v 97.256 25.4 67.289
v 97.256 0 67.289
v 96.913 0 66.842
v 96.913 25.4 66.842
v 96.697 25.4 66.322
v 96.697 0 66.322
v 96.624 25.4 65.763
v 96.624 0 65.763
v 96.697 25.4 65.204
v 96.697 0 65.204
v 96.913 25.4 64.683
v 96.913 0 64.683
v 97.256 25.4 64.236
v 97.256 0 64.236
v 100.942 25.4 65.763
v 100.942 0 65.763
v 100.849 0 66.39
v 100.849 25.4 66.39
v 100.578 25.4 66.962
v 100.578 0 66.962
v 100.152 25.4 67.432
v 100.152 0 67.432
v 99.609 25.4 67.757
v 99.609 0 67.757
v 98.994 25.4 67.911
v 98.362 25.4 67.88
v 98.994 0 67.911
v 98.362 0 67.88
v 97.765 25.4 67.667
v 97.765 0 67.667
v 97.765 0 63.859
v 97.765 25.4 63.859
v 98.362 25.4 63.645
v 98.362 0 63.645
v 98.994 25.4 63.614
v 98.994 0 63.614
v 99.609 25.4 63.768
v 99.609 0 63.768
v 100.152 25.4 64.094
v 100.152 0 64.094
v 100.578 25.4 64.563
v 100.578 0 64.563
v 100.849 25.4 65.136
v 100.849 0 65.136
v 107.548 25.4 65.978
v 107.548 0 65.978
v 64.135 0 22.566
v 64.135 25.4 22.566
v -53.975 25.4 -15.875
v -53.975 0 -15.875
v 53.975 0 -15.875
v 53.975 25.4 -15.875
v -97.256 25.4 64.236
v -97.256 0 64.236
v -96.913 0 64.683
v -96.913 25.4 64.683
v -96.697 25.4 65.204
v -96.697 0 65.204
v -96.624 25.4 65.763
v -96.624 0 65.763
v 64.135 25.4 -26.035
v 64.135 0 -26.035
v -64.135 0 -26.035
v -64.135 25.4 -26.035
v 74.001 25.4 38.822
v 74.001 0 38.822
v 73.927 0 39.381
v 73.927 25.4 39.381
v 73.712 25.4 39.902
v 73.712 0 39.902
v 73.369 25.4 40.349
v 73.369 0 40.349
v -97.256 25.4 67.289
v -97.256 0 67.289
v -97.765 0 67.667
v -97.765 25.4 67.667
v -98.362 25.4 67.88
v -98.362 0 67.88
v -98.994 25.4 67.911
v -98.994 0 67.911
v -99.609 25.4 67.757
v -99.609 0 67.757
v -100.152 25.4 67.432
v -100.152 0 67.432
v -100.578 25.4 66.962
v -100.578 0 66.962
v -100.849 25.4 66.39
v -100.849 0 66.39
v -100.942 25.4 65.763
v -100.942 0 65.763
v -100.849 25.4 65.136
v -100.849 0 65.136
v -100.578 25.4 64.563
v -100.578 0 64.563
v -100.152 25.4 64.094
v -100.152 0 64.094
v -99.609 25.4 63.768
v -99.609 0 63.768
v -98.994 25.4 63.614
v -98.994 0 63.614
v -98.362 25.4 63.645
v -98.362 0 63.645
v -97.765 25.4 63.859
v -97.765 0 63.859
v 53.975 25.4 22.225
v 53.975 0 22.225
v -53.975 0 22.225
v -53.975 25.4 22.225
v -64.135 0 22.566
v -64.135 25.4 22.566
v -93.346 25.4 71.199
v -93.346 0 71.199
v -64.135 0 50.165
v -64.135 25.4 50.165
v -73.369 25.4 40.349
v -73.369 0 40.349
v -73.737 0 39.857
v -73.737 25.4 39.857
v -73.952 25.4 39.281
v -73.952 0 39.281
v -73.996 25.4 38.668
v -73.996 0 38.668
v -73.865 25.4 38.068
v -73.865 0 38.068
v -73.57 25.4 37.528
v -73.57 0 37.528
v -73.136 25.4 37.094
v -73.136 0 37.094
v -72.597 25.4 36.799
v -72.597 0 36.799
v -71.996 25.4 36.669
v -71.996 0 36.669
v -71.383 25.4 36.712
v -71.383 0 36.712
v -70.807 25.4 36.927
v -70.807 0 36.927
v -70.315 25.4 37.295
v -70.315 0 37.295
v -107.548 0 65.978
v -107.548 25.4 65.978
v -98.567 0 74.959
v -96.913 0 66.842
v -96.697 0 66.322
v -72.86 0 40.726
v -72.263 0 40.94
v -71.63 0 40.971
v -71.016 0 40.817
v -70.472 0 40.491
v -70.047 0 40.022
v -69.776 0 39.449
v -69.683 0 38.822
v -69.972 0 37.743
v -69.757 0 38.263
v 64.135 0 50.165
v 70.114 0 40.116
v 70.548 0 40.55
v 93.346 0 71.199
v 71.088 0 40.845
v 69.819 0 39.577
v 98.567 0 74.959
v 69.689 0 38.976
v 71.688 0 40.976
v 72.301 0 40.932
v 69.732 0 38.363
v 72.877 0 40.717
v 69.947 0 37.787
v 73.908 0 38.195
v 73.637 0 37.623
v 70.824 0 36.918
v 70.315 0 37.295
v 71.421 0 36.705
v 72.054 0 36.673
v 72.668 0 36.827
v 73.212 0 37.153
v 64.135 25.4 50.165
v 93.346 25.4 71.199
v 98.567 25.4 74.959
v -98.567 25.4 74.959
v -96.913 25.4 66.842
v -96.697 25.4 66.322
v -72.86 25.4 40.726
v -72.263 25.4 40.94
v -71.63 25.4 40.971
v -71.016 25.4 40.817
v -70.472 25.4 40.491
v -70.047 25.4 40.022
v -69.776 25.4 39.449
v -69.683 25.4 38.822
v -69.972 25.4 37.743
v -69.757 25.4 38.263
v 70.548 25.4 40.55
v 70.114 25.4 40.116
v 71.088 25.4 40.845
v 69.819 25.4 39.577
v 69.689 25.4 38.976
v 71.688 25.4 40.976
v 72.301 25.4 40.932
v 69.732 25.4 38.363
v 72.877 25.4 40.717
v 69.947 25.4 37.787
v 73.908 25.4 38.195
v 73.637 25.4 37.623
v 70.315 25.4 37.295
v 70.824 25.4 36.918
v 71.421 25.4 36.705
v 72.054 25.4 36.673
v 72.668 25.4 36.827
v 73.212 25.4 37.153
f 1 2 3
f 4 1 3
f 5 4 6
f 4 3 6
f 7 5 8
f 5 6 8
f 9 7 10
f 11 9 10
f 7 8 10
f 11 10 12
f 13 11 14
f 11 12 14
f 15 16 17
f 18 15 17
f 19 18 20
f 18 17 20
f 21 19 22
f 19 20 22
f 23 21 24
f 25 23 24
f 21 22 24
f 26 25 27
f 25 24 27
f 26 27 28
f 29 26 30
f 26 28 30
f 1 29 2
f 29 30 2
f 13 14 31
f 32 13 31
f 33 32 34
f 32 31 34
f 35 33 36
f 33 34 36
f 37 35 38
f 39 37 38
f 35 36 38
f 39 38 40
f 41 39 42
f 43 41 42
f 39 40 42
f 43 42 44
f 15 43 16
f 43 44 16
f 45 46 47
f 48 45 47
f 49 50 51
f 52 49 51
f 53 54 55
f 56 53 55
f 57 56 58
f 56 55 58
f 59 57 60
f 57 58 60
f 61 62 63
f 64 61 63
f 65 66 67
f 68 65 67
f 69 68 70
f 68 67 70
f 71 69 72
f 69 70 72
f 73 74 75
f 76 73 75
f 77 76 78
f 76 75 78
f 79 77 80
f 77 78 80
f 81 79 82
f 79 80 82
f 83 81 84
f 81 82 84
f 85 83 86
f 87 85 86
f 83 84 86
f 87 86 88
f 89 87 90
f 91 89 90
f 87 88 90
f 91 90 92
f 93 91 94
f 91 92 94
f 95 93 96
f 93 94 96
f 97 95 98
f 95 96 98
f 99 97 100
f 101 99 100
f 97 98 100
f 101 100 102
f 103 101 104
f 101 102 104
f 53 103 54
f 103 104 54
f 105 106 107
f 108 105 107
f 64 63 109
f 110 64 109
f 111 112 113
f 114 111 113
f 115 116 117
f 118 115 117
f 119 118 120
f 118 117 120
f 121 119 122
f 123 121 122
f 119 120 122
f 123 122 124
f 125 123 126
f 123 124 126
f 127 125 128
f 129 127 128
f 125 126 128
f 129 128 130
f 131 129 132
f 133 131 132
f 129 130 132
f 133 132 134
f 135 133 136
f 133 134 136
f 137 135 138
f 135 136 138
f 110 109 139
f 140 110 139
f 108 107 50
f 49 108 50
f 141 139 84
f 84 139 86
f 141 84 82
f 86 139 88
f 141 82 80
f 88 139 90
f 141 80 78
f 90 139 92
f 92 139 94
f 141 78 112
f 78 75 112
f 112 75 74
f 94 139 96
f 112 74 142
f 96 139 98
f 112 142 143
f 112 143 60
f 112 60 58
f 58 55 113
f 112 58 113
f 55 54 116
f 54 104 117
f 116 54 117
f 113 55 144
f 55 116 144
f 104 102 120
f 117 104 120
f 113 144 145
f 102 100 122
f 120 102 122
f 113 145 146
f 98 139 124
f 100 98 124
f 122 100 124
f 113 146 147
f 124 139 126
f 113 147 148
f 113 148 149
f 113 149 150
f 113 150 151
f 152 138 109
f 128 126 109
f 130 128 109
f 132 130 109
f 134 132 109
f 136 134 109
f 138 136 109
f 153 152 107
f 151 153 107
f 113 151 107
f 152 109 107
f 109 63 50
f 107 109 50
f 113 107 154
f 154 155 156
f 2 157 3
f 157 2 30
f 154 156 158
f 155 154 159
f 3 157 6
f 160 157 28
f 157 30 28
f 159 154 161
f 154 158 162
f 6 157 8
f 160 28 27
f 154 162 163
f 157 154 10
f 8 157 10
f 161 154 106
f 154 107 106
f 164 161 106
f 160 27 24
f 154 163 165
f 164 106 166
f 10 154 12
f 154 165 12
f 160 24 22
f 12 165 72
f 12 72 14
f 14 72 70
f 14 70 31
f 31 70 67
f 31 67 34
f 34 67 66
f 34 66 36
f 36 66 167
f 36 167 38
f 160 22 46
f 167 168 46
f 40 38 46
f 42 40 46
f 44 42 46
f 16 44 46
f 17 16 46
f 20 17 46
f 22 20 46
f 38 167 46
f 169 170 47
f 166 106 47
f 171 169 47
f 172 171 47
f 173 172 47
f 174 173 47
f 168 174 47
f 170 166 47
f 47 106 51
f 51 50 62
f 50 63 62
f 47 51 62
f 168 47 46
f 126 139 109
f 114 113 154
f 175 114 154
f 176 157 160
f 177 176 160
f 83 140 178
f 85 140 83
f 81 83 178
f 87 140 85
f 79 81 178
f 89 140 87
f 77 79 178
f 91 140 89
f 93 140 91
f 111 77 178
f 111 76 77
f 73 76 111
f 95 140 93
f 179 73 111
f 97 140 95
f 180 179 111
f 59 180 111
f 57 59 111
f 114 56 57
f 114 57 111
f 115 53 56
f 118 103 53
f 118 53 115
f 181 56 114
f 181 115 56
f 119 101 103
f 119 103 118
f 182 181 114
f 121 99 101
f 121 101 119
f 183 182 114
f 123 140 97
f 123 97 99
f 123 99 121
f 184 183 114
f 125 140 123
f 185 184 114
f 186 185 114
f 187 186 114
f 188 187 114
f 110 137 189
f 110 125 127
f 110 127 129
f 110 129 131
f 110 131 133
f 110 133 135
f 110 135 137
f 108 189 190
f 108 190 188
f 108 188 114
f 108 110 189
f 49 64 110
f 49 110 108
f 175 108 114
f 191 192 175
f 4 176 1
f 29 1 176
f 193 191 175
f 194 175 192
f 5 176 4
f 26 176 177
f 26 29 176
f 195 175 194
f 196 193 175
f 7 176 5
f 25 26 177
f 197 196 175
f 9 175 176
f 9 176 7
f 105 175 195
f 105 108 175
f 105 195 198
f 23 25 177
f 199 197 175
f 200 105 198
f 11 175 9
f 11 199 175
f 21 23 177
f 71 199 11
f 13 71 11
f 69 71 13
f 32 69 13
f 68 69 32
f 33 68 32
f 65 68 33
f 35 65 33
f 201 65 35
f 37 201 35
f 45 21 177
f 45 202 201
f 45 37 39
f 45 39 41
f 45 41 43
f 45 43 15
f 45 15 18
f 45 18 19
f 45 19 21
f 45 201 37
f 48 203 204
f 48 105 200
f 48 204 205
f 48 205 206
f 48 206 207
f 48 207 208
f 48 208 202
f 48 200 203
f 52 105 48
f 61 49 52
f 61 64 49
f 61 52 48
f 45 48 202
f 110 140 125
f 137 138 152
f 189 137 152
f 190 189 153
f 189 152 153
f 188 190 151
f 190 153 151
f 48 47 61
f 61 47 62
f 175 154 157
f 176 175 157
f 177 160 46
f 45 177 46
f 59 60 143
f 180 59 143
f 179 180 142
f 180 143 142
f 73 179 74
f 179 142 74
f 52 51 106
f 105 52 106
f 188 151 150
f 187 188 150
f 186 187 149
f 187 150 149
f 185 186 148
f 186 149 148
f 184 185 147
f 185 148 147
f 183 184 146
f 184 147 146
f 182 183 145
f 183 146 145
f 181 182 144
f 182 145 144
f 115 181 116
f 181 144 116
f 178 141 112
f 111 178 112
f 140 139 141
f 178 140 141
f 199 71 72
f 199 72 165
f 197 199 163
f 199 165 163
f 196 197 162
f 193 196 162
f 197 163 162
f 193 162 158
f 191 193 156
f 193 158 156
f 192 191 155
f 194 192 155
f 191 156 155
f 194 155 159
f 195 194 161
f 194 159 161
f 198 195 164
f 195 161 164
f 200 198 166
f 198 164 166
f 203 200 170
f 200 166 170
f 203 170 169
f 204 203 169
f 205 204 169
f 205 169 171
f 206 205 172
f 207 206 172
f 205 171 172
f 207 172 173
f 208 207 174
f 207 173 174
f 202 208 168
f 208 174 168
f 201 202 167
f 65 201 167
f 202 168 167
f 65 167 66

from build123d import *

# Parameters (mm, degrees)
BOSS_EXTRUDE1_DEPTH = 25.4


with BuildPart() as part:
    # Sketch3 → Boss-Extrude1 (new body)
    with BuildSketch(Plane(origin=(0, 0, 0), x_dir=(1, 0, 0), z_dir=(0, 1, 0))):
        Polygon((-53.975, -20.955), (-64.135, -31.115), (-64.135, -50.165), (64.135, -50.165), (64.135, -31.115), (53.975, -20.955), (53.975, -22.225), (-53.975, -22.225), align=None)
        Polygon((-64.135, 26.035), (-64.135, -22.565796173), (-64.135, -31.115), (-53.975, -20.955), (-53.975, 15.875), (-17.145, 15.875), (-6.985, 26.035), align=None)
        Polygon((6.985, 26.035), (-6.985, 26.035), (-17.145, 15.875), (17.145, 15.875), align=None)
        Polygon((64.135, 26.035), (6.985, 26.035), (17.145, 15.875), (53.975, 15.875), (53.975, -20.955), (64.135, -31.115), (64.135, -22.565796173), align=None)
        with BuildLine():
            Line((64.135, -22.565796173), (64.135, -31.115))
            Line((64.135, -31.115), (70.315405428, -37.295405428))
            ThreePointArc((70.315405428, -37.295405428), (72.668262499, -36.827393058), (74.001048969, -38.822048969))
            ThreePointArc((74.001048969, -38.822048969), (73.836704879, -39.648262499), (73.368692509, -40.348692509))
            Line((73.368692509, -40.348692509), (97.256173791, -64.236173791))
            ThreePointArc((97.256173791, -64.236173791), (99.609030862, -63.768161421), (100.941817332, -65.762817332))
            ThreePointArc((100.941817332, -65.762817332), (99.609030862, -67.757473242), (97.256173791, -67.289460872))
            Line((97.256173791, -67.289460872), (93.346419205, -71.199215458))
            Line((93.346419205, -71.199215458), (98.567291185, -74.9585996))
            Line((98.567291185, -74.9585996), (107.547547306, -65.978343479))
            Line((107.547547306, -65.978343479), (64.135, -22.565796173))
        make_face()
        with BuildLine():
            Line((64.135, -31.115), (64.135, -50.165))
            Line((64.135, -50.165), (93.346419205, -71.199215458))
            Line((93.346419205, -71.199215458), (97.256173791, -67.289460872))
            ThreePointArc((97.256173791, -67.289460872), (96.623817332, -65.762817332), (97.256173791, -64.236173791))
            Line((97.256173791, -64.236173791), (73.368692509, -40.348692509))
            ThreePointArc((73.368692509, -40.348692509), (70.315405428, -40.348692509), (70.315405428, -37.295405428))
            Line((70.315405428, -37.295405428), (64.135, -31.115))
        make_face()
        with BuildLine():
            Line((-64.135, -50.165), (-64.135, -31.115))
            Line((-64.135, -31.115), (-70.315405428, -37.295405428))
            ThreePointArc((-70.315405428, -37.295405428), (-69.847393058, -37.995835438), (-69.683048969, -38.822048969))
            ThreePointArc((-69.683048969, -38.822048969), (-71.015835438, -40.816704879), (-73.368692509, -40.348692509))
            Line((-73.368692509, -40.348692509), (-97.256173791, -64.236173791))
            ThreePointArc((-97.256173791, -64.236173791), (-96.788161421, -64.936603801), (-96.623817332, -65.762817332))
            ThreePointArc((-96.623817332, -65.762817332), (-96.788161421, -66.589030862), (-97.256173791, -67.289460872))
            Line((-97.256173791, -67.289460872), (-93.346419205, -71.199215458))
            Line((-93.346419205, -71.199215458), (-64.135, -50.165))
        make_face()
        with BuildLine():
            Line((-64.135, -31.115), (-64.135, -22.565796173))
            Line((-64.135, -22.565796173), (-107.547547306, -65.978343479))
            Line((-107.547547306, -65.978343479), (-98.567291185, -74.9585996))
            Line((-98.567291185, -74.9585996), (-93.346419205, -71.199215458))
            Line((-93.346419205, -71.199215458), (-97.256173791, -67.289460872))
            ThreePointArc((-97.256173791, -67.289460872), (-100.941817332, -65.762817332), (-97.256173791, -64.236173791))
            Line((-97.256173791, -64.236173791), (-73.368692509, -40.348692509))
            ThreePointArc((-73.368692509, -40.348692509), (-73.368692509, -37.295405428), (-70.315405428, -37.295405428))
            Line((-70.315405428, -37.295405428), (-64.135, -31.115))
        make_face()
    extrude(amount=BOSS_EXTRUDE1_DEPTH)


solid = part.part
